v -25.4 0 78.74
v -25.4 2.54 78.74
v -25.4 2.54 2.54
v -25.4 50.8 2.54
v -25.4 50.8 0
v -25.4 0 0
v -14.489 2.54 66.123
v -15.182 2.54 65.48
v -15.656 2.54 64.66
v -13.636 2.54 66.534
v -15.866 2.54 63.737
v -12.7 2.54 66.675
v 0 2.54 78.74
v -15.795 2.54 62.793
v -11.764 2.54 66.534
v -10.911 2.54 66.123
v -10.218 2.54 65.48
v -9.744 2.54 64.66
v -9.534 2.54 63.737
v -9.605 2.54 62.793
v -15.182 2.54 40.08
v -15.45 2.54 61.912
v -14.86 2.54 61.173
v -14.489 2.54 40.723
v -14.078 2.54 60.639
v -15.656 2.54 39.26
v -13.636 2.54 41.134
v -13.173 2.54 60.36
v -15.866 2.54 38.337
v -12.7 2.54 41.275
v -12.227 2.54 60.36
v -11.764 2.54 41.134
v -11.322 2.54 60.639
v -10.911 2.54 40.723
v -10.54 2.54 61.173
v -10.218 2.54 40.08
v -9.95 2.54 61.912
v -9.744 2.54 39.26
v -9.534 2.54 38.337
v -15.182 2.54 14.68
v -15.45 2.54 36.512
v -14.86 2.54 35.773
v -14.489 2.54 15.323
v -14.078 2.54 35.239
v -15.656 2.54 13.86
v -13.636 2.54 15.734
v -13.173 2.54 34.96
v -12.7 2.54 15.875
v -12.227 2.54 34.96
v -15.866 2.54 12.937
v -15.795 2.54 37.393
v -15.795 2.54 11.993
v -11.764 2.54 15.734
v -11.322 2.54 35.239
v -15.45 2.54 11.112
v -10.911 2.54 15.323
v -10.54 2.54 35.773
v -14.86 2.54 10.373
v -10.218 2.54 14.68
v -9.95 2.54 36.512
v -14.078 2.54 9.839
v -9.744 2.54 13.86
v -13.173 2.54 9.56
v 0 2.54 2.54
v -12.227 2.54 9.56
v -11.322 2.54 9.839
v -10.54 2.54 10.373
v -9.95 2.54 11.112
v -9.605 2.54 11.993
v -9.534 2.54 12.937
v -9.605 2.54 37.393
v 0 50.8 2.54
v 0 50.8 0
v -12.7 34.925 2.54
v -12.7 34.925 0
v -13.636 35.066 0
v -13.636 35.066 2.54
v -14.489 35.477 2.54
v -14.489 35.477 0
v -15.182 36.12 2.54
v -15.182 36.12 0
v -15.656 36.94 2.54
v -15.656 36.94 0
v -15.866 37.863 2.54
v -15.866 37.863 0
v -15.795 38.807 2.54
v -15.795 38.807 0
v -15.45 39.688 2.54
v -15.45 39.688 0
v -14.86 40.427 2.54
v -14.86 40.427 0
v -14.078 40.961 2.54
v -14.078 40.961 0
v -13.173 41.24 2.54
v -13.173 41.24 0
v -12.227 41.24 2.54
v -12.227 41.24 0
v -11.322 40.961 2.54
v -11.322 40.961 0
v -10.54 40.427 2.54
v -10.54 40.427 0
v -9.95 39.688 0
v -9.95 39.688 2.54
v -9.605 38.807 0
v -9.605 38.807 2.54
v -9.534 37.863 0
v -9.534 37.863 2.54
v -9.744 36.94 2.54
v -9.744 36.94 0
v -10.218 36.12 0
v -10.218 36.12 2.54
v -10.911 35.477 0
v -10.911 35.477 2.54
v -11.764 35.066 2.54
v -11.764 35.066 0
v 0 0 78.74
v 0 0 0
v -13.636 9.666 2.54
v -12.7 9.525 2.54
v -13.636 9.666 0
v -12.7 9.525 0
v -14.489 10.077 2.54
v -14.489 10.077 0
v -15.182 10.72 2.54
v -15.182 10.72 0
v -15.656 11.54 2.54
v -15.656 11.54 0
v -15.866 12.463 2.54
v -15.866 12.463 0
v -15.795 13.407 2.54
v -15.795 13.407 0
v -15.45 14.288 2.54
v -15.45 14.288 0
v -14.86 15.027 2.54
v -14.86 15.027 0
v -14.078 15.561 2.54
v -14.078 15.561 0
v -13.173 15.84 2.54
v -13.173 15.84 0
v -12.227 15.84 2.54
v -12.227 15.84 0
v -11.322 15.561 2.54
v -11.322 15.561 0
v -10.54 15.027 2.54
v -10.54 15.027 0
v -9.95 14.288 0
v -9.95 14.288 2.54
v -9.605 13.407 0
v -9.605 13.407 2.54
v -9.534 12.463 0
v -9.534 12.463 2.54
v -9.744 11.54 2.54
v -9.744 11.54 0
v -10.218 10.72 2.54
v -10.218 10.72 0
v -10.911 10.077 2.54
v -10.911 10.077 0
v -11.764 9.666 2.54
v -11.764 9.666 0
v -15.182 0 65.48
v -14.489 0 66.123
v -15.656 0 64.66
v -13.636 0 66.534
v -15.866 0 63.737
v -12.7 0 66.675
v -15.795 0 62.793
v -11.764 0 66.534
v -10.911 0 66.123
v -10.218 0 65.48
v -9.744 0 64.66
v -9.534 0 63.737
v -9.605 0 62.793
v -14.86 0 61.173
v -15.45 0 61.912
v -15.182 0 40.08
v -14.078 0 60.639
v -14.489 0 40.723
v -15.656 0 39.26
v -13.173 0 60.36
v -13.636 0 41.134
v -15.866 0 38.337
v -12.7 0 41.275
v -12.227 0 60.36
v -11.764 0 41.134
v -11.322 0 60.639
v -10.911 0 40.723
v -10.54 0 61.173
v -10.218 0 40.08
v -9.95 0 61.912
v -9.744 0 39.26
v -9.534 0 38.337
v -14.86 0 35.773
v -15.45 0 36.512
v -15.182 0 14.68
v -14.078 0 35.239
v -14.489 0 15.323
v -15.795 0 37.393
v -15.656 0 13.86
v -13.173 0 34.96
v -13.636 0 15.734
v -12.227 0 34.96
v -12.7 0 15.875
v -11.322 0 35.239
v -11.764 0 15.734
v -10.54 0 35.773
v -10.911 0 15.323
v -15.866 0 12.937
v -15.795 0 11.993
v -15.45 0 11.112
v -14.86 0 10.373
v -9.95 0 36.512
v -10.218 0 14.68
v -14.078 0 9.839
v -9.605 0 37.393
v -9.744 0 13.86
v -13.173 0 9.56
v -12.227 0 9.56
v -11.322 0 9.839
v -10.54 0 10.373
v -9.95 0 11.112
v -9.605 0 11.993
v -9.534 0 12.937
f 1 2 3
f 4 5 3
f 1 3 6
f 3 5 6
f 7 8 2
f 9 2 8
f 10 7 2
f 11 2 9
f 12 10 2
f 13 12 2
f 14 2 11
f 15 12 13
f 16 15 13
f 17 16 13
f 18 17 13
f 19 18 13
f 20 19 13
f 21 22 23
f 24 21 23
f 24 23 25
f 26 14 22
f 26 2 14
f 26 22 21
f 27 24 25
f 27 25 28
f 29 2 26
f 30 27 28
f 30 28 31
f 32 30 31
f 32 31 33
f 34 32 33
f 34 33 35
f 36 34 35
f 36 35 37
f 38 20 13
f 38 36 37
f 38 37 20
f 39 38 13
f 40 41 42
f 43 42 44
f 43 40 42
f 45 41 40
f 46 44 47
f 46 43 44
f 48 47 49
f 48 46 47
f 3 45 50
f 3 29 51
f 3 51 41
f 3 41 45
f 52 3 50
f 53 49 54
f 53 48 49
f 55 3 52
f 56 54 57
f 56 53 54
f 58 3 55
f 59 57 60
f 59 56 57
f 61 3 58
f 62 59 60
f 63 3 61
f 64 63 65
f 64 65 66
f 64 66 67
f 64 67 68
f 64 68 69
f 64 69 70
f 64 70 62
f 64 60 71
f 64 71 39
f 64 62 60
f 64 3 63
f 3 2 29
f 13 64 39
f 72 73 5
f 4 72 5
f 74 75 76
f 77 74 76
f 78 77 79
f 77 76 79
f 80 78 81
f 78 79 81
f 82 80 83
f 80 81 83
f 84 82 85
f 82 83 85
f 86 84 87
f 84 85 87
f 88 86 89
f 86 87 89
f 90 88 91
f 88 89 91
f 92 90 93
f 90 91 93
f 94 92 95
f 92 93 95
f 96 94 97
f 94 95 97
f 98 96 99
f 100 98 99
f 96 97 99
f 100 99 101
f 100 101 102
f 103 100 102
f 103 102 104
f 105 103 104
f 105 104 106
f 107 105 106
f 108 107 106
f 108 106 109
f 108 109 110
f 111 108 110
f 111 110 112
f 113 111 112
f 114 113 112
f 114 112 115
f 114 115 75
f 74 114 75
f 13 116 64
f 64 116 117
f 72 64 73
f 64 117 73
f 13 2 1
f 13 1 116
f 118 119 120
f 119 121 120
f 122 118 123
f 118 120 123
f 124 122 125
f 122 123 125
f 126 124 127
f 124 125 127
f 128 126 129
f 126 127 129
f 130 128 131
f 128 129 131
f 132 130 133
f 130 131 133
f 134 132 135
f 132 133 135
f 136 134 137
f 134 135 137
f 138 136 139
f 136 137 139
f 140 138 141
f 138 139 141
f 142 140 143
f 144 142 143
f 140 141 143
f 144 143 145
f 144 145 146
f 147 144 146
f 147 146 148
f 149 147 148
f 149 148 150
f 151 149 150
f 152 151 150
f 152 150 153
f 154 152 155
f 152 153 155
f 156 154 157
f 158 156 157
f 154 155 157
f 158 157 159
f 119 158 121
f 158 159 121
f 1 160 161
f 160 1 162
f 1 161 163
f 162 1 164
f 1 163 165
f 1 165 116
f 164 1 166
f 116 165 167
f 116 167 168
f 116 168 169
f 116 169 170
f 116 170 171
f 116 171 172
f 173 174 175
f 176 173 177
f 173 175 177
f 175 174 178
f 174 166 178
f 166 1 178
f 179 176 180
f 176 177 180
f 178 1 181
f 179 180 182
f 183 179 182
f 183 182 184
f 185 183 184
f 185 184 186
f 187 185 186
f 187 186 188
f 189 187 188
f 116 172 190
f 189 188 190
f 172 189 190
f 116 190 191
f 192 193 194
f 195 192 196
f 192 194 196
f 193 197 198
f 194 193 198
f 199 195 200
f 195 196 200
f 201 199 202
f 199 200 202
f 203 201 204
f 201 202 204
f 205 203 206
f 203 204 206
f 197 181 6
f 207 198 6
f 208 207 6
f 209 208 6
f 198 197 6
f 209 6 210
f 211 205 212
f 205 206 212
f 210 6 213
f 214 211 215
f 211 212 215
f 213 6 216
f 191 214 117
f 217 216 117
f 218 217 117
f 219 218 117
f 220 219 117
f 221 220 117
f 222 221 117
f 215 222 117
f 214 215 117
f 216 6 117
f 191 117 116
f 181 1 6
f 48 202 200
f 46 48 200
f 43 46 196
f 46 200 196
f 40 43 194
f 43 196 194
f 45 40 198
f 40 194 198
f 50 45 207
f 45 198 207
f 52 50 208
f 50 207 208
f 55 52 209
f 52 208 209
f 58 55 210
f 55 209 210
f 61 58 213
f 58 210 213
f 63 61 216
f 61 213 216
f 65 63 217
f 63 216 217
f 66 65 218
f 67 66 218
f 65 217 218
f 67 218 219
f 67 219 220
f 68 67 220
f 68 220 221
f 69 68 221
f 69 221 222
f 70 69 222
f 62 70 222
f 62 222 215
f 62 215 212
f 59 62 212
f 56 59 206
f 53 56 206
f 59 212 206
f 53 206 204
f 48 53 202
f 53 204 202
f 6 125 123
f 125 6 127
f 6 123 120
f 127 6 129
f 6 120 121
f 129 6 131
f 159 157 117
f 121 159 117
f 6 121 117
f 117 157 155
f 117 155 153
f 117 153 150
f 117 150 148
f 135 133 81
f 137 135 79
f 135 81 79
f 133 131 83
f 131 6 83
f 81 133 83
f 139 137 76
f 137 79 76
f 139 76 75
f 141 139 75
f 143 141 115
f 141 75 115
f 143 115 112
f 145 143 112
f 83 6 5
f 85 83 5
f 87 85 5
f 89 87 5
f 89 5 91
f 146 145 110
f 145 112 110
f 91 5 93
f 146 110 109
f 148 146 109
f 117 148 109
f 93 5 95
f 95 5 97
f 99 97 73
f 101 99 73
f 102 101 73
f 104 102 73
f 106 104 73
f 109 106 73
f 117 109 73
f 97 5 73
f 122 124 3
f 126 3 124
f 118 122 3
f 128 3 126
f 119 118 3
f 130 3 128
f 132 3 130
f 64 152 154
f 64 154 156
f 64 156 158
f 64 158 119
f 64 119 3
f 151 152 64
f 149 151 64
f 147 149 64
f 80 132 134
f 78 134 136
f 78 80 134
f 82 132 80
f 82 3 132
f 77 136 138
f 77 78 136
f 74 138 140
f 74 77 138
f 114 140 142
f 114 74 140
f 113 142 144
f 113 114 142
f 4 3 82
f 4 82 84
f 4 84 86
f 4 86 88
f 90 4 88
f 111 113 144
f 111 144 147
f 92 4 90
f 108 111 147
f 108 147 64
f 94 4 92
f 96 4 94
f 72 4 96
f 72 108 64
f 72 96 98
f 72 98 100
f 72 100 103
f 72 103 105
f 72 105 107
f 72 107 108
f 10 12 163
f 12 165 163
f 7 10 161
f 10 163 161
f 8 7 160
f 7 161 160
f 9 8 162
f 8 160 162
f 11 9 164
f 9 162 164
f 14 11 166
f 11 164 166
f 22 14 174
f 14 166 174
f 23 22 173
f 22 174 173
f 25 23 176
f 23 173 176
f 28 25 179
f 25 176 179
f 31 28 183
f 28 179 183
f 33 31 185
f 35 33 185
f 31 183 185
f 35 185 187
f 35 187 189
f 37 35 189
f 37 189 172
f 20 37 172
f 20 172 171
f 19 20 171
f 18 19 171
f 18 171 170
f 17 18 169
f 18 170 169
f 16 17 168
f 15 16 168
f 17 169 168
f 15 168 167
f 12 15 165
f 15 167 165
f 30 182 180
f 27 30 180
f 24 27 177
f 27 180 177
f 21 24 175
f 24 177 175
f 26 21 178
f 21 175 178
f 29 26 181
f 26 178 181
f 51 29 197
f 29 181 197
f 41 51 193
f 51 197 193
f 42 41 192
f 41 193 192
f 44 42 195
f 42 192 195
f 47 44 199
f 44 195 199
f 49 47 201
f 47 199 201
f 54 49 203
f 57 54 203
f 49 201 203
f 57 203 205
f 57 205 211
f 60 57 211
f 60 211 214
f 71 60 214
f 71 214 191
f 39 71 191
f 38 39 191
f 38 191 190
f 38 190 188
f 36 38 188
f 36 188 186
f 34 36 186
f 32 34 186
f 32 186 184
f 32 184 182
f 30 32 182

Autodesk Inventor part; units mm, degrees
ref_plane "YZ Plane" through (0, 0, 0) normal (1, 0, 0) x (0, 1, 0)
ref_plane "XZ Plane" through (0, 0, 0) normal (0, 1, 0) x (-1, 0, 0)
ref_plane "XY Plane" through (0, 0, 0) normal (0, 0, 1) x (1, 0, 0)
sketch "Sketch1" plane through (0, 0, 0) normal (0, 0, 1) x (1, 0, 0)
  line L0 (0, 0) -> (0, 50.8)
  line L1 (0, 50.8) -> (-25.4, 50.8)
  line L2 (-25.4, 50.8) -> (-25.4, 0)
  line L3 (-25.4, 0) -> (0, 0)
  dimension "d0" = 50.8
  dimension "d2" = 25.4
extrude "Extrusion1" add sketch "Sketch1" along normal blind 2.54
sketch "Sketch2" plane through (0, 0, 2.54) normal (0, 0, 1) x (1, 0, 0)
  line L0 (-25.4, 0) -> (-25.4, 2.54)
  line L1 (-25.4, 50.8) -> (-25.4, 0) projected
  line L2 (-25.4, 2.54) -> (0, 2.54)
  line L3 (0, 0) -> (0, 50.8) projected
  line L4 (0, 0) -> (-25.4, 0)
  line L5 (-25.4, 0) -> (0, 0) projected
  dimension "d5" = 2.54
extrude "Extrusion2" add sketch "Sketch2" along normal blind 76.2
hole "Hole1" at (-12.7, 2.54, 12.7) direction (0, -1, 0) diameter 6.35 end through all
pattern_linear "Rectangular Pattern1" count 3 spacing 25.4 along (0, 0, 1) of "Hole1"
hole "Hole2" at (-12.7, 12.7, 2.54) direction (0, 0, -1) diameter 6.35 end through all
pattern_linear "Rectangular Pattern2" count 2 spacing 25.4 along (0, 1, 0) of "Hole2"
properties part number "L-Gusset"
